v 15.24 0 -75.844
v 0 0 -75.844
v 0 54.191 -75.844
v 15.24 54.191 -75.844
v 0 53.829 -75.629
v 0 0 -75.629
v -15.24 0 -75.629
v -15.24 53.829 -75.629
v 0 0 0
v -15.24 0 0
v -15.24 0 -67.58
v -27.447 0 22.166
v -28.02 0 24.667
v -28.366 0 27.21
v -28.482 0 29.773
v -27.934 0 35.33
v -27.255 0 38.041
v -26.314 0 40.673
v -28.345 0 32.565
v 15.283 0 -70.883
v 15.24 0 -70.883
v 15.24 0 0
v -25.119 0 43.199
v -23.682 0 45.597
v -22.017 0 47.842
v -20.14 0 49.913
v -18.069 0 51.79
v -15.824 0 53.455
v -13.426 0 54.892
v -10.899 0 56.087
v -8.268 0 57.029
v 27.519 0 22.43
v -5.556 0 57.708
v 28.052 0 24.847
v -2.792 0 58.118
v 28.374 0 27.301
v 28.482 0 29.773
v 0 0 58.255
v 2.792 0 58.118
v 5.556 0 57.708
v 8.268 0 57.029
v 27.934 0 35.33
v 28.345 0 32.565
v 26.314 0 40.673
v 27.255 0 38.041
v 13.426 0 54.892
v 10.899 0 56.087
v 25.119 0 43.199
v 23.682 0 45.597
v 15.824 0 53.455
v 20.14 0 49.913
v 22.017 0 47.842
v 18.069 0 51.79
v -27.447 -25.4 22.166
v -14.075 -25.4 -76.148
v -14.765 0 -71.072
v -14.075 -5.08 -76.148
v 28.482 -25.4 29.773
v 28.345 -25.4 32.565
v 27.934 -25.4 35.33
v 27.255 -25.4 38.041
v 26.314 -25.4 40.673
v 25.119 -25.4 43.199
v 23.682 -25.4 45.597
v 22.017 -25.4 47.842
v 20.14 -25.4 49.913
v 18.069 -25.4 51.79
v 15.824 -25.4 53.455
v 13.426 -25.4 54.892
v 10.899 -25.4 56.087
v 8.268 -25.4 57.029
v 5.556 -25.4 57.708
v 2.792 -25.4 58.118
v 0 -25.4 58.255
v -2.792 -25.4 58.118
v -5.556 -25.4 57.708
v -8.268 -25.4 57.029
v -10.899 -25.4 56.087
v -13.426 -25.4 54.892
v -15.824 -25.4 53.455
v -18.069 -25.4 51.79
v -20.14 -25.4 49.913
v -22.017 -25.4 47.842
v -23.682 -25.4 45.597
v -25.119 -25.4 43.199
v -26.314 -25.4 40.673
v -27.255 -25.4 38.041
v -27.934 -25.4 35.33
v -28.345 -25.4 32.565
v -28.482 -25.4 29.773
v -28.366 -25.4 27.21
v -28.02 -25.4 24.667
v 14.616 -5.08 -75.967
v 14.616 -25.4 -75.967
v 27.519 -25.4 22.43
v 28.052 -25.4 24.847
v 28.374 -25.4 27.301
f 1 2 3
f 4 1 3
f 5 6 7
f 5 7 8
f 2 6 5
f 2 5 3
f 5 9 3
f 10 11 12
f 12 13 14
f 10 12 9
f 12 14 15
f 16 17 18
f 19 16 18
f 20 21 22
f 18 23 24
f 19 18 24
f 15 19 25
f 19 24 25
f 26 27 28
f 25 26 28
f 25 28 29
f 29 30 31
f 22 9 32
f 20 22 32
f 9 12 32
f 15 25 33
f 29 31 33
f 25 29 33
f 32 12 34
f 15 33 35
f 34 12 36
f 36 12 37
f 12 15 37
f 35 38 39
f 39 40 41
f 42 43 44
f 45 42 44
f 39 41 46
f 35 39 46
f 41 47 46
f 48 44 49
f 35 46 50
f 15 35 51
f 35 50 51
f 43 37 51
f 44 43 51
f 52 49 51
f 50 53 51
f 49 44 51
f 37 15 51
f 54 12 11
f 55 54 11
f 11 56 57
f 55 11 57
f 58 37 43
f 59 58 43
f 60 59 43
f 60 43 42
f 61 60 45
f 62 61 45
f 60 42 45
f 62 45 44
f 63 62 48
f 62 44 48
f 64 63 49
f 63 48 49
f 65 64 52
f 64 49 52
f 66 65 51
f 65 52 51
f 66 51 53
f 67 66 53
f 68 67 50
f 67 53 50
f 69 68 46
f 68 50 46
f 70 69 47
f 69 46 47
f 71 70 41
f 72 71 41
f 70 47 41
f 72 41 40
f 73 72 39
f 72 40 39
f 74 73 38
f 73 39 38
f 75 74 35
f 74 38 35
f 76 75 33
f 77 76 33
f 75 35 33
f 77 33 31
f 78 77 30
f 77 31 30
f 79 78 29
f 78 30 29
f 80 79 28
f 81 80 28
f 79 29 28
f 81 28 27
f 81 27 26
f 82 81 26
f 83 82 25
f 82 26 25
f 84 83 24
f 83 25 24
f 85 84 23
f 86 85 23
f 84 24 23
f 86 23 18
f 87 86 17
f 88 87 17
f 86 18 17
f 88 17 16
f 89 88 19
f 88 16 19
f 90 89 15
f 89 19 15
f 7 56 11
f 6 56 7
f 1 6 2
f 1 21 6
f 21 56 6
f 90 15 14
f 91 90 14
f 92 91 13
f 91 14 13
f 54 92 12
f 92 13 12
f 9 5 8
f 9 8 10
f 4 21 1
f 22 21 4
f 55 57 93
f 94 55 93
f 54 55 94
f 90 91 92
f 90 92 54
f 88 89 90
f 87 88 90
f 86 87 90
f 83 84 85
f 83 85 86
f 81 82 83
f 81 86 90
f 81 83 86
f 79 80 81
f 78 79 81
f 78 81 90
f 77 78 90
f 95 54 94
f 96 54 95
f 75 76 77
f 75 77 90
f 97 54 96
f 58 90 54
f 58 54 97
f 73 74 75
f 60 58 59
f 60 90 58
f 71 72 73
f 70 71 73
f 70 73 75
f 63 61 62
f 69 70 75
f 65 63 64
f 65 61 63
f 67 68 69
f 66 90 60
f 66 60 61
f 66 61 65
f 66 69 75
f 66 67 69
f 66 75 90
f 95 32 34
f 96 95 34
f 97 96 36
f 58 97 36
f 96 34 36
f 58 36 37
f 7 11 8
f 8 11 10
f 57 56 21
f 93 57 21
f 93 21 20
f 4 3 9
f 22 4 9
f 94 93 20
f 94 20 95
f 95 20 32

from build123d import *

# Parameters (mm, degrees)
F1_DEPTH = 25.4
F2_SIZE  = 5.08
F4_DEPTH = 15.24
F6_DEPTH = 15.24


with BuildPart() as f1:
    # F0 (on Front) → F1 (new body)
    with BuildSketch(Plane.XZ):
        with BuildLine():
            Line((27.518749, 22.430017), (28.481669, 29.77331))
            ThreePointArc((28.481669, 29.77331), (0, 58.254979), (-28.481669, 29.77331))
            Line((-28.481669, 29.77331), (-27.446961, 22.166089))
            ThreePointArc((-27.446961, 22.166089), (0.136758, 1.291969), (27.518749, 22.430017))
        make_face()
        with BuildLine():
            ThreePointArc((27.518749, 22.430017), (28.239913, 26.070231), (28.481669, 29.77331))
            Line((28.481669, 29.77331), (27.518749, 22.430017))
        make_face()
        with BuildLine():
            Line((-27.446961, 22.166089), (-28.481669, 29.77331))
            ThreePointArc((-28.481669, 29.77331), (-28.221807, 25.934676), (-27.446961, 22.166089))
        make_face()
        with BuildLine():
            Line((14.615998, -75.967178), (27.518749, 22.430017))
            ThreePointArc((27.518749, 22.430017), (0.136758, 1.291969), (-27.446961, 22.166089))
            Line((-27.446961, 22.166089), (-14.074668, -76.147616))
            Line((-14.074668, -76.147616), (14.615998, -75.967178))
        make_face()
    extrude(amount=F1_DEPTH)

    # F2
    f2_edges = [f1.edges().sort_by_distance(p)[0] for p in [
        (0.270665, 0, -76.057397),
    ]]
    chamfer(f2_edges, length=F2_SIZE)

    # F3 (on Right) → F4 (join)
    with BuildSketch(Plane.YZ):
        Polygon((54.190729, -75.843684), (0, 0), (0, -75.843684), align=None)
    extrude(amount=F4_DEPTH)

    # F5 (on Right) → F6 (join)
    with BuildSketch(Plane.YZ):
        Polygon((53.829387, -75.629257), (0, 0), (0, -75.629257), align=None)
    extrude(amount=-F6_DEPTH)


solid = f1.part
